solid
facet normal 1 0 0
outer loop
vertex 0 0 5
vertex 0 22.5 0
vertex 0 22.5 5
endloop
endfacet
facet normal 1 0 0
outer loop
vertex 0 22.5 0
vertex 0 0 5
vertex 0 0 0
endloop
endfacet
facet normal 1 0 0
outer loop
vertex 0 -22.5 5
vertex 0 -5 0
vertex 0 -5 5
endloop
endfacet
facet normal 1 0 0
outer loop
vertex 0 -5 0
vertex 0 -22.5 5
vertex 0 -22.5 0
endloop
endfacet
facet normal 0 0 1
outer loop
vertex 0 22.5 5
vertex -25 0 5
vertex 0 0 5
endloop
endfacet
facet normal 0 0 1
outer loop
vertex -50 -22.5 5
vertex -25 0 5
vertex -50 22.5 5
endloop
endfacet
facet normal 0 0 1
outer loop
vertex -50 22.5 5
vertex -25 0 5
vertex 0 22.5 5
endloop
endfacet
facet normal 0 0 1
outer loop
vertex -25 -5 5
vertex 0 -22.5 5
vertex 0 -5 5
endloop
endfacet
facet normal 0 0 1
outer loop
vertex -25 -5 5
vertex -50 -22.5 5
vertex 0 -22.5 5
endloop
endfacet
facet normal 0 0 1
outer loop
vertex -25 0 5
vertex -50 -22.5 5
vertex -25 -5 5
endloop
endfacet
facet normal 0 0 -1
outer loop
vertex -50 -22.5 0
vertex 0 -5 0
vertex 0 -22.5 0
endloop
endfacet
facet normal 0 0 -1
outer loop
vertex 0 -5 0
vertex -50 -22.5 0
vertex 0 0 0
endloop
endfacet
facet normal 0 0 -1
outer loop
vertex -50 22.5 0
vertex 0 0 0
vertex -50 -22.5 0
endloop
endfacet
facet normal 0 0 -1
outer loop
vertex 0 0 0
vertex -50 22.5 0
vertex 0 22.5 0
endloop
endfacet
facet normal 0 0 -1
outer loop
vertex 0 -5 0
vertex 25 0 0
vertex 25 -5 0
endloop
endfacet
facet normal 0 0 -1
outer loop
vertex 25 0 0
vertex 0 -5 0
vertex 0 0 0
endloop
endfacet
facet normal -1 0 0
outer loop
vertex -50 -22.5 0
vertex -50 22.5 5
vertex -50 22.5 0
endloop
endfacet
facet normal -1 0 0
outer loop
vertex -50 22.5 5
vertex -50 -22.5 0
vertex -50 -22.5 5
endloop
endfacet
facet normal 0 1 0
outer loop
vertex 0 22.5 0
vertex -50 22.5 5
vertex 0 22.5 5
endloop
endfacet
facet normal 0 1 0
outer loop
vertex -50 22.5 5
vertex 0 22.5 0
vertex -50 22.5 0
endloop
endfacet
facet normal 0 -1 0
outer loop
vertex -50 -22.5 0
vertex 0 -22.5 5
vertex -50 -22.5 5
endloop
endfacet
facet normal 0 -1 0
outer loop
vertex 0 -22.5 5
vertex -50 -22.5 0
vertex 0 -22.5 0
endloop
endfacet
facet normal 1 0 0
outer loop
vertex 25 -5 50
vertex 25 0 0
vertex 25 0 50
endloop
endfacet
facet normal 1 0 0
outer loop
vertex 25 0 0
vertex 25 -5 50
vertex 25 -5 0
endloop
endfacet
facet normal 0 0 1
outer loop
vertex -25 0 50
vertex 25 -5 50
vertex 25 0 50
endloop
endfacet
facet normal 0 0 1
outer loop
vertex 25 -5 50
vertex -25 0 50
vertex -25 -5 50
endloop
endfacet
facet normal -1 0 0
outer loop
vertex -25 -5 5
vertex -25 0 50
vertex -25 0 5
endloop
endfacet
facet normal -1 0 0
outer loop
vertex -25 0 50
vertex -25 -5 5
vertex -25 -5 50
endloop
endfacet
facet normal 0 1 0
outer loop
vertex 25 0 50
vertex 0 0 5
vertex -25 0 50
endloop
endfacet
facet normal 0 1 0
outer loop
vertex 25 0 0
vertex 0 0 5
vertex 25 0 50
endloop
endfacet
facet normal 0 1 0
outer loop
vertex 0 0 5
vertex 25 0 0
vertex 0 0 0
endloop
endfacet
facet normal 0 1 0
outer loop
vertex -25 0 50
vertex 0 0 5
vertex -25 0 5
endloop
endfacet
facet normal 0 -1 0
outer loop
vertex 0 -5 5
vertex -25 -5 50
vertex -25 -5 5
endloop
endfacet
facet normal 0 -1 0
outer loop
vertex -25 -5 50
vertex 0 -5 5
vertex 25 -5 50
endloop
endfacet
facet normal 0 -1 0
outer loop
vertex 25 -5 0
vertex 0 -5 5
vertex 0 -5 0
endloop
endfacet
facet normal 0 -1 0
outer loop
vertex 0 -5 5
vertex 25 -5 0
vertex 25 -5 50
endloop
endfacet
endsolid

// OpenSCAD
// Built by bench/smallmodels/features/compiler.py from a list of features.
$fn = 64;
difference() {
  union() {
    translate([-25, 0, 0]) translate([-25, -22.5, 0]) cube([50, 45, 5]);
    translate([0, -2.5, 0]) translate([-25, -2.5, 0]) cube([50, 5, 50]);
  }
  union() {
    translate([-17, 30, 5]) rotate([0, 0, 0]) rotate([0, 90, 0]) cylinder(d = 4.5, h = 1200, center = true);
    translate([17, 30, 5]) rotate([0, 0, 0]) rotate([0, 90, 0]) cylinder(d = 4.5, h = 1200, center = true);
  }
}
